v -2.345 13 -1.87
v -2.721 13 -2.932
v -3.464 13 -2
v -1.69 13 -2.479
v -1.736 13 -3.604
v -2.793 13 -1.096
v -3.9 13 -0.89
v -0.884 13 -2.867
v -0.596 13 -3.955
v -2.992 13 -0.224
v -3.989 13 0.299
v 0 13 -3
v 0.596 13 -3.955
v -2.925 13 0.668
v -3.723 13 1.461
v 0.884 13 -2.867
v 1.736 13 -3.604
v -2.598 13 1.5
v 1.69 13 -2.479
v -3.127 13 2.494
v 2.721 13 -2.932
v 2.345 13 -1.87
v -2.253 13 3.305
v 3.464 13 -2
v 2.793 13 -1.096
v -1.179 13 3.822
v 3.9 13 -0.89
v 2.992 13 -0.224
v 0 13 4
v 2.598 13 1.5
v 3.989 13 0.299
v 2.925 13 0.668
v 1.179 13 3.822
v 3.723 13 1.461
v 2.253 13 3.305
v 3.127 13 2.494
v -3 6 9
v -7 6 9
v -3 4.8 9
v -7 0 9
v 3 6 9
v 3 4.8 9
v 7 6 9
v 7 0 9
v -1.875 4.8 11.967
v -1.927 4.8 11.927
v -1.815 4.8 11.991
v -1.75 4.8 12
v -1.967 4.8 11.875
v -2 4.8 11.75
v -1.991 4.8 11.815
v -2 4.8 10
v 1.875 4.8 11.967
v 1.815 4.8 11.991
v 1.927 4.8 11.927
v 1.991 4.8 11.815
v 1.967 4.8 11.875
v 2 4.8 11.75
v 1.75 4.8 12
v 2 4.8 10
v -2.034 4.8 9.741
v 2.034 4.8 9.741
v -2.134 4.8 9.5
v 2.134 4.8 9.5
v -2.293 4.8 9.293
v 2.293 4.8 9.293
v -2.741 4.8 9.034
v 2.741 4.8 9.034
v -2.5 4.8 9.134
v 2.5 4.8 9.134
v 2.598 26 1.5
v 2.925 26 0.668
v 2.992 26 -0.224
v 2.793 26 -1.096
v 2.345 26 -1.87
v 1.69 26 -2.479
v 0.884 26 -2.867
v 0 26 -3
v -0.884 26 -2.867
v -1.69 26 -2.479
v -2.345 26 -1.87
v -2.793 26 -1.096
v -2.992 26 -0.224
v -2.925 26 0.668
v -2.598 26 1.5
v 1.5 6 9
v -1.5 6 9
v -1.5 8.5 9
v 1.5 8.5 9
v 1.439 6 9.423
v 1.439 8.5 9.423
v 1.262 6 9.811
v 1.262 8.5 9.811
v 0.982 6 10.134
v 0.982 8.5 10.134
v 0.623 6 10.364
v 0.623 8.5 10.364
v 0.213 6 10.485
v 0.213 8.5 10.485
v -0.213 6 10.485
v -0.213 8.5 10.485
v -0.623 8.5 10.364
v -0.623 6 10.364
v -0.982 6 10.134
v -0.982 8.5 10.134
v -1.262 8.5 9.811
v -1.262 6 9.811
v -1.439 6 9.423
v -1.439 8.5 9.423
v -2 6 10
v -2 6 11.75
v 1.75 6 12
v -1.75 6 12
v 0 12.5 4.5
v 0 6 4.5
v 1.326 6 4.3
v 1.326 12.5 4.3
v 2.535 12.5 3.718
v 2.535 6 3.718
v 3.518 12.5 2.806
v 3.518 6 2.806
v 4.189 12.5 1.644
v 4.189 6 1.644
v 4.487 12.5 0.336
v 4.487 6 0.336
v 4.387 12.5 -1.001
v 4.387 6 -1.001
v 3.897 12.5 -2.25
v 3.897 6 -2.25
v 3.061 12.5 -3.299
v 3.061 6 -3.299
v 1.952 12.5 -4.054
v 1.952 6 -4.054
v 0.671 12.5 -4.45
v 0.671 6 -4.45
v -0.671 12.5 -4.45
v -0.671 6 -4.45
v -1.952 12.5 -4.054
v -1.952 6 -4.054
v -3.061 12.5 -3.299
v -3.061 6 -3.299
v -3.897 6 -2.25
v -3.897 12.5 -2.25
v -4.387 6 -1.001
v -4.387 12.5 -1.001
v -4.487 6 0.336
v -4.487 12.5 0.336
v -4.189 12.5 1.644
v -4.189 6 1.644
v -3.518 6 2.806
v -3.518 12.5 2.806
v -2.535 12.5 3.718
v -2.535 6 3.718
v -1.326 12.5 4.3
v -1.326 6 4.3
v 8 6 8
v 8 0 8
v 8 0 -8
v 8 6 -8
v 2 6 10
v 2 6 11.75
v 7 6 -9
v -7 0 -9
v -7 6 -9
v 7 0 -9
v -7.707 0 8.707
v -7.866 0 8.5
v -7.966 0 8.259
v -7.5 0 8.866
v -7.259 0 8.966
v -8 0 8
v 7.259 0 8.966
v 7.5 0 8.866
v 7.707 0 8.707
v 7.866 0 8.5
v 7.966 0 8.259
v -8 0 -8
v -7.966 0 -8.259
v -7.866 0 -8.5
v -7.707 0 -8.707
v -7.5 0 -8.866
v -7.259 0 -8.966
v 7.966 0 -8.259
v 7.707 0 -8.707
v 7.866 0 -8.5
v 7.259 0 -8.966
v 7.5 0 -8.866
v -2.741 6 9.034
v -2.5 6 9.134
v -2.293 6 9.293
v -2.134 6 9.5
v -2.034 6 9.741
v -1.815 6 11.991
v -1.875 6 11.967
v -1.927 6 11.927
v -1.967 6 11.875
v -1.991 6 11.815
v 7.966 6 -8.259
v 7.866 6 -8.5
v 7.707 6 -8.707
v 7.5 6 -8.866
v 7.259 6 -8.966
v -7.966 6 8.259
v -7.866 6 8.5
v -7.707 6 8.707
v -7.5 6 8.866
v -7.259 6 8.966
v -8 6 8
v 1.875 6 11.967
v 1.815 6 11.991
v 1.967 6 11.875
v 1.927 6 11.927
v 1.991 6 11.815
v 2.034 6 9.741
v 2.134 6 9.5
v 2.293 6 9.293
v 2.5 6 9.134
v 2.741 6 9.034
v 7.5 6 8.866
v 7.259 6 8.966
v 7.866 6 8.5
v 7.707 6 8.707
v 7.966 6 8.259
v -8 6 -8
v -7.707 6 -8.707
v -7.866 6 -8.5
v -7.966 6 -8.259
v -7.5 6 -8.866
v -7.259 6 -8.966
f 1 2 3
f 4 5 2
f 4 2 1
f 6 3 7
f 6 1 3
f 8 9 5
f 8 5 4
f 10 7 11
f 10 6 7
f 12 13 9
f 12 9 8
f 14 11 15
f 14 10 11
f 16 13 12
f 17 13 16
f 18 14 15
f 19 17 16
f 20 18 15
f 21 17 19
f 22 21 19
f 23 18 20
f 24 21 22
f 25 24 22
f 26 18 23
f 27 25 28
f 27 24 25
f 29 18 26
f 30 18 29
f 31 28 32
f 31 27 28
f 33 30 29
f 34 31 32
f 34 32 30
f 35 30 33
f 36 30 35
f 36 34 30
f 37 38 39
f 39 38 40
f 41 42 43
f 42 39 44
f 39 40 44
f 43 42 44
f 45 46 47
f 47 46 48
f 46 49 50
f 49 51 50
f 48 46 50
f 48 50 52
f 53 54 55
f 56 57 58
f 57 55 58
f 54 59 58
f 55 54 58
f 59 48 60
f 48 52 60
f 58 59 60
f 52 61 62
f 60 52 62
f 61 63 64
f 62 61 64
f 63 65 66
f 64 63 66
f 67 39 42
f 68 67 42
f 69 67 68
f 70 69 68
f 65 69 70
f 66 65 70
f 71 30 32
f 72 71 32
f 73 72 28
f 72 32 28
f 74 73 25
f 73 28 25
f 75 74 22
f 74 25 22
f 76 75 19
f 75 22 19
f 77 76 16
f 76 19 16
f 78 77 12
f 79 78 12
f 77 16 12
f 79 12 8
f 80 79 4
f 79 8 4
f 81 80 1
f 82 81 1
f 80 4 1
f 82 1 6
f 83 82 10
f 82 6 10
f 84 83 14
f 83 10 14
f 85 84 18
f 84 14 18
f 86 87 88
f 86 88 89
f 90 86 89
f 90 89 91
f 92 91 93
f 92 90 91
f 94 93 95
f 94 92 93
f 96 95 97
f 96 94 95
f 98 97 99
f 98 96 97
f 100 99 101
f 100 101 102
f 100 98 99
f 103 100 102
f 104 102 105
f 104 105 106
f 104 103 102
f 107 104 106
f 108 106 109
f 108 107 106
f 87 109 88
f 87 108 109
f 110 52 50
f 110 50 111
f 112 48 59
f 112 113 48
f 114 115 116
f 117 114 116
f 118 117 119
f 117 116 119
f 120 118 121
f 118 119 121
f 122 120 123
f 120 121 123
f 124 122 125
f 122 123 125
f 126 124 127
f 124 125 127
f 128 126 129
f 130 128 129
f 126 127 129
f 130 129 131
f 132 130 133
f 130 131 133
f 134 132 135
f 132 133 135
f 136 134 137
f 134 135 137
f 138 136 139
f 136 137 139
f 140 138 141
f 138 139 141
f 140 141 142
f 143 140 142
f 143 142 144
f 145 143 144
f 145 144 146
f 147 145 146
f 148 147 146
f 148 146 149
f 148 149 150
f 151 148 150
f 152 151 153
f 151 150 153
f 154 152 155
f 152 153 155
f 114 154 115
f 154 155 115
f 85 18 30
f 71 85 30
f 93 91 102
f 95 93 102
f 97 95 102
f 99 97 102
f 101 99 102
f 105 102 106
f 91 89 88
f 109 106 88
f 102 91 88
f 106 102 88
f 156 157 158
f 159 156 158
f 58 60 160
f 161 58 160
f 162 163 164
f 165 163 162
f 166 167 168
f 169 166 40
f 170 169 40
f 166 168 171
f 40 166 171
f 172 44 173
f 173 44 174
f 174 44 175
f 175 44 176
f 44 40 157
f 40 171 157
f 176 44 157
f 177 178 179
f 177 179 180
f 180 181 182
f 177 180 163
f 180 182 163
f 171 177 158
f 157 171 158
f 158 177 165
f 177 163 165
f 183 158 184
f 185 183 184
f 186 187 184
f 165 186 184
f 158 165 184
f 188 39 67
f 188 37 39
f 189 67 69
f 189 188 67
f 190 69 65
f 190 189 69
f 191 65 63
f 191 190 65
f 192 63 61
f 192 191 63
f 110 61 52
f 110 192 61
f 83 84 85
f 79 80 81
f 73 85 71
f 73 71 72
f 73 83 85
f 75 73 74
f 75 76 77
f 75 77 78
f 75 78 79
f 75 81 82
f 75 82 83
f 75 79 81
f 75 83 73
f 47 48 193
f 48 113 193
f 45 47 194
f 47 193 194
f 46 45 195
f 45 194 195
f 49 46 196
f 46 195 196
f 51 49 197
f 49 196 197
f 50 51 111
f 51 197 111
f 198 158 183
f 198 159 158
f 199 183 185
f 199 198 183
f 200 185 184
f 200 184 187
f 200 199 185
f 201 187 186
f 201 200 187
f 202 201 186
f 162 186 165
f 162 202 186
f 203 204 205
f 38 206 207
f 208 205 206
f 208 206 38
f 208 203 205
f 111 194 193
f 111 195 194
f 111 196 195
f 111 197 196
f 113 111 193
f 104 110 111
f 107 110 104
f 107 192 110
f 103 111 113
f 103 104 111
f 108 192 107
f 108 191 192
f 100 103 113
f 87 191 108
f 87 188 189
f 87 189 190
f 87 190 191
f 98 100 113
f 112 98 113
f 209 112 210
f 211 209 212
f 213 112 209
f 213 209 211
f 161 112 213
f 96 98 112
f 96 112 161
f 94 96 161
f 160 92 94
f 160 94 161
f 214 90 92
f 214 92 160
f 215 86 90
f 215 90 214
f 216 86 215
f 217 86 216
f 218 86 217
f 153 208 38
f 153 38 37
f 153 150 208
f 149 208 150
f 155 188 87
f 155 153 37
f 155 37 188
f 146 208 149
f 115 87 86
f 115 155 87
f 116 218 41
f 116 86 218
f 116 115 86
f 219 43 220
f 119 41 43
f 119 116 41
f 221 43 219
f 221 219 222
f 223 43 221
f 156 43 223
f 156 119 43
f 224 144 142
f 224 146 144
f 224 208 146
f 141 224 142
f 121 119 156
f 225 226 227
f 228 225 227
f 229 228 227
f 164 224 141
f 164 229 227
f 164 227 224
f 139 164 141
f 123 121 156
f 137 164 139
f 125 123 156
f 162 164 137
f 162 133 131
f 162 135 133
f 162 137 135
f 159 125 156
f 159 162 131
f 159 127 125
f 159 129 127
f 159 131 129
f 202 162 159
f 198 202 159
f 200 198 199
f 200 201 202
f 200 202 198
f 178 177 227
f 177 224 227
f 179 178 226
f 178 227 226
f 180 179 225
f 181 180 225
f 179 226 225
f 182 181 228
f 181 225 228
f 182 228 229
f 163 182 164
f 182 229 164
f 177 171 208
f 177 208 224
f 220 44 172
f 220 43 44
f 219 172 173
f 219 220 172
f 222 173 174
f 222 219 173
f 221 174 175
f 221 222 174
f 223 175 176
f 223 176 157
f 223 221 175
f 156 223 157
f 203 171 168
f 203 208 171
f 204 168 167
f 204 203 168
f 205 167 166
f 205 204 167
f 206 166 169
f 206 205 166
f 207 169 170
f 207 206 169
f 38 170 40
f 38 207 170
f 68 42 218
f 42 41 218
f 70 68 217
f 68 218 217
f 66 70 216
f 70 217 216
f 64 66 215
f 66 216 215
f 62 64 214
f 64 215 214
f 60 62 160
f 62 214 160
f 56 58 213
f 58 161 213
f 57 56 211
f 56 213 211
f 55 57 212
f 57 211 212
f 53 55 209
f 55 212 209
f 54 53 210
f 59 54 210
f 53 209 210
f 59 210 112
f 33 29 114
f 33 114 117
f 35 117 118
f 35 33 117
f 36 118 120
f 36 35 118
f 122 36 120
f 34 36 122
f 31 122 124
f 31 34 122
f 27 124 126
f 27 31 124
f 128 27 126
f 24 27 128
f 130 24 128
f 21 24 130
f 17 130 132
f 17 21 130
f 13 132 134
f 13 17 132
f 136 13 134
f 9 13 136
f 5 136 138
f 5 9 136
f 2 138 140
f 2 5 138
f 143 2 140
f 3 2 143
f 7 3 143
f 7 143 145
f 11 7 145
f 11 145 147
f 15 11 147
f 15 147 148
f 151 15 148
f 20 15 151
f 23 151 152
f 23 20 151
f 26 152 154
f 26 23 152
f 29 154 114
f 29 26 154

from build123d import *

# Parameters (mm, degrees)
SKETCH_1_W      = 16
SKETCH_1_H      = 18
EXTRUDE_1_DEPTH = 6
FILLET_1_R      = 1
SKETCH_2_W      = 4
SKETCH_2_H      = 1.2
EXTRUDE_2_DEPTH = 3
FILLET_2_R      = 1
FILLET_3_R      = 0.25
SKETCH_3_R      = 4.5
EXTRUDE_3_DEPTH = 7
CHAMFER_1_SIZE  = 0.5
EXTRUDE_4_DEPTH = 13
EXTRUDE_5_DEPTH = 2.5


with BuildPart() as part:
    # Эскиз1 → Бобышка-Вытянуть1 (new body)
    with BuildSketch(Plane(origin=(0, 0, 0), x_dir=(1, 0, 0), z_dir=(0, 1, 0))):
        Rectangle(SKETCH_1_W, SKETCH_1_H)
    extrude(amount=EXTRUDE_1_DEPTH)

    # Скругление1
    fillet_1_edges = [part.edges().sort_by_distance(p)[0] for p in [
        (8, 3, 9),
        (-8, 3, 9),
        (-8, 3, -9),
        (8, 3, -9),
    ]]
    fillet(fillet_1_edges, radius=FILLET_1_R)

    # Эскиз2 → Бобышка-Вытянуть2 (add)
    with BuildSketch(Plane.XY.offset(9)):
        with Locations((0, 5.4)):
            Rectangle(SKETCH_2_W, SKETCH_2_H)
    extrude(amount=EXTRUDE_2_DEPTH)

    # Скругление2
    fillet_2_edges = [part.edges().sort_by_distance(p)[0] for p in [
        (2, 5.4, 9),
        (-2, 5.4, 9),
    ]]
    fillet(fillet_2_edges, radius=FILLET_2_R)

    # Скругление3
    fillet_3_edges = [part.edges().sort_by_distance(p)[0] for p in [
        (2, 5.4, 12),
        (-2, 5.4, 12),
    ]]
    fillet(fillet_3_edges, radius=FILLET_3_R)

    # Эскиз3 → Бобышка-Вытянуть3 (add)
    with BuildSketch(Plane(origin=(0, 6, 0), x_dir=(1, 0, 0), z_dir=(0, 1, 0))):
        with Locations(Location((0, 0, 0), (0, 0, 270))):
            Circle(SKETCH_3_R)
    extrude(amount=EXTRUDE_3_DEPTH)

    # Фаска1
    chamfer_1_edges = [part.edges().sort_by_distance(p)[0] for p in [
        (0, 13, -4.5),
    ]]
    chamfer(chamfer_1_edges, length=CHAMFER_1_SIZE)

    # Эскиз4 → Бобышка-Вытянуть4 (add)
    with BuildSketch(Plane(origin=(0, 13, 0), x_dir=(1, 0, 0), z_dir=(0, 1, 0))):
        with BuildLine():
            Line((-2.598076211, -1.5), (2.598076211, -1.5))
            ThreePointArc((2.598076211, -1.5), (0, 3), (-2.598076211, -1.5))
        make_face()
    extrude(amount=EXTRUDE_4_DEPTH)

    # Эскиз5 → Бобышка-Вытянуть5 (add)
    with BuildSketch(Plane(origin=(0, 6, 0), x_dir=(1, 0, 0), z_dir=(0, 1, 0))):
        with BuildLine():
            Line((-1.5, -9), (1.5, -9))
            ThreePointArc((1.5, -9), (0, -10.5), (-1.5, -9))
        make_face()
    extrude(amount=EXTRUDE_5_DEPTH)


solid = part.part
